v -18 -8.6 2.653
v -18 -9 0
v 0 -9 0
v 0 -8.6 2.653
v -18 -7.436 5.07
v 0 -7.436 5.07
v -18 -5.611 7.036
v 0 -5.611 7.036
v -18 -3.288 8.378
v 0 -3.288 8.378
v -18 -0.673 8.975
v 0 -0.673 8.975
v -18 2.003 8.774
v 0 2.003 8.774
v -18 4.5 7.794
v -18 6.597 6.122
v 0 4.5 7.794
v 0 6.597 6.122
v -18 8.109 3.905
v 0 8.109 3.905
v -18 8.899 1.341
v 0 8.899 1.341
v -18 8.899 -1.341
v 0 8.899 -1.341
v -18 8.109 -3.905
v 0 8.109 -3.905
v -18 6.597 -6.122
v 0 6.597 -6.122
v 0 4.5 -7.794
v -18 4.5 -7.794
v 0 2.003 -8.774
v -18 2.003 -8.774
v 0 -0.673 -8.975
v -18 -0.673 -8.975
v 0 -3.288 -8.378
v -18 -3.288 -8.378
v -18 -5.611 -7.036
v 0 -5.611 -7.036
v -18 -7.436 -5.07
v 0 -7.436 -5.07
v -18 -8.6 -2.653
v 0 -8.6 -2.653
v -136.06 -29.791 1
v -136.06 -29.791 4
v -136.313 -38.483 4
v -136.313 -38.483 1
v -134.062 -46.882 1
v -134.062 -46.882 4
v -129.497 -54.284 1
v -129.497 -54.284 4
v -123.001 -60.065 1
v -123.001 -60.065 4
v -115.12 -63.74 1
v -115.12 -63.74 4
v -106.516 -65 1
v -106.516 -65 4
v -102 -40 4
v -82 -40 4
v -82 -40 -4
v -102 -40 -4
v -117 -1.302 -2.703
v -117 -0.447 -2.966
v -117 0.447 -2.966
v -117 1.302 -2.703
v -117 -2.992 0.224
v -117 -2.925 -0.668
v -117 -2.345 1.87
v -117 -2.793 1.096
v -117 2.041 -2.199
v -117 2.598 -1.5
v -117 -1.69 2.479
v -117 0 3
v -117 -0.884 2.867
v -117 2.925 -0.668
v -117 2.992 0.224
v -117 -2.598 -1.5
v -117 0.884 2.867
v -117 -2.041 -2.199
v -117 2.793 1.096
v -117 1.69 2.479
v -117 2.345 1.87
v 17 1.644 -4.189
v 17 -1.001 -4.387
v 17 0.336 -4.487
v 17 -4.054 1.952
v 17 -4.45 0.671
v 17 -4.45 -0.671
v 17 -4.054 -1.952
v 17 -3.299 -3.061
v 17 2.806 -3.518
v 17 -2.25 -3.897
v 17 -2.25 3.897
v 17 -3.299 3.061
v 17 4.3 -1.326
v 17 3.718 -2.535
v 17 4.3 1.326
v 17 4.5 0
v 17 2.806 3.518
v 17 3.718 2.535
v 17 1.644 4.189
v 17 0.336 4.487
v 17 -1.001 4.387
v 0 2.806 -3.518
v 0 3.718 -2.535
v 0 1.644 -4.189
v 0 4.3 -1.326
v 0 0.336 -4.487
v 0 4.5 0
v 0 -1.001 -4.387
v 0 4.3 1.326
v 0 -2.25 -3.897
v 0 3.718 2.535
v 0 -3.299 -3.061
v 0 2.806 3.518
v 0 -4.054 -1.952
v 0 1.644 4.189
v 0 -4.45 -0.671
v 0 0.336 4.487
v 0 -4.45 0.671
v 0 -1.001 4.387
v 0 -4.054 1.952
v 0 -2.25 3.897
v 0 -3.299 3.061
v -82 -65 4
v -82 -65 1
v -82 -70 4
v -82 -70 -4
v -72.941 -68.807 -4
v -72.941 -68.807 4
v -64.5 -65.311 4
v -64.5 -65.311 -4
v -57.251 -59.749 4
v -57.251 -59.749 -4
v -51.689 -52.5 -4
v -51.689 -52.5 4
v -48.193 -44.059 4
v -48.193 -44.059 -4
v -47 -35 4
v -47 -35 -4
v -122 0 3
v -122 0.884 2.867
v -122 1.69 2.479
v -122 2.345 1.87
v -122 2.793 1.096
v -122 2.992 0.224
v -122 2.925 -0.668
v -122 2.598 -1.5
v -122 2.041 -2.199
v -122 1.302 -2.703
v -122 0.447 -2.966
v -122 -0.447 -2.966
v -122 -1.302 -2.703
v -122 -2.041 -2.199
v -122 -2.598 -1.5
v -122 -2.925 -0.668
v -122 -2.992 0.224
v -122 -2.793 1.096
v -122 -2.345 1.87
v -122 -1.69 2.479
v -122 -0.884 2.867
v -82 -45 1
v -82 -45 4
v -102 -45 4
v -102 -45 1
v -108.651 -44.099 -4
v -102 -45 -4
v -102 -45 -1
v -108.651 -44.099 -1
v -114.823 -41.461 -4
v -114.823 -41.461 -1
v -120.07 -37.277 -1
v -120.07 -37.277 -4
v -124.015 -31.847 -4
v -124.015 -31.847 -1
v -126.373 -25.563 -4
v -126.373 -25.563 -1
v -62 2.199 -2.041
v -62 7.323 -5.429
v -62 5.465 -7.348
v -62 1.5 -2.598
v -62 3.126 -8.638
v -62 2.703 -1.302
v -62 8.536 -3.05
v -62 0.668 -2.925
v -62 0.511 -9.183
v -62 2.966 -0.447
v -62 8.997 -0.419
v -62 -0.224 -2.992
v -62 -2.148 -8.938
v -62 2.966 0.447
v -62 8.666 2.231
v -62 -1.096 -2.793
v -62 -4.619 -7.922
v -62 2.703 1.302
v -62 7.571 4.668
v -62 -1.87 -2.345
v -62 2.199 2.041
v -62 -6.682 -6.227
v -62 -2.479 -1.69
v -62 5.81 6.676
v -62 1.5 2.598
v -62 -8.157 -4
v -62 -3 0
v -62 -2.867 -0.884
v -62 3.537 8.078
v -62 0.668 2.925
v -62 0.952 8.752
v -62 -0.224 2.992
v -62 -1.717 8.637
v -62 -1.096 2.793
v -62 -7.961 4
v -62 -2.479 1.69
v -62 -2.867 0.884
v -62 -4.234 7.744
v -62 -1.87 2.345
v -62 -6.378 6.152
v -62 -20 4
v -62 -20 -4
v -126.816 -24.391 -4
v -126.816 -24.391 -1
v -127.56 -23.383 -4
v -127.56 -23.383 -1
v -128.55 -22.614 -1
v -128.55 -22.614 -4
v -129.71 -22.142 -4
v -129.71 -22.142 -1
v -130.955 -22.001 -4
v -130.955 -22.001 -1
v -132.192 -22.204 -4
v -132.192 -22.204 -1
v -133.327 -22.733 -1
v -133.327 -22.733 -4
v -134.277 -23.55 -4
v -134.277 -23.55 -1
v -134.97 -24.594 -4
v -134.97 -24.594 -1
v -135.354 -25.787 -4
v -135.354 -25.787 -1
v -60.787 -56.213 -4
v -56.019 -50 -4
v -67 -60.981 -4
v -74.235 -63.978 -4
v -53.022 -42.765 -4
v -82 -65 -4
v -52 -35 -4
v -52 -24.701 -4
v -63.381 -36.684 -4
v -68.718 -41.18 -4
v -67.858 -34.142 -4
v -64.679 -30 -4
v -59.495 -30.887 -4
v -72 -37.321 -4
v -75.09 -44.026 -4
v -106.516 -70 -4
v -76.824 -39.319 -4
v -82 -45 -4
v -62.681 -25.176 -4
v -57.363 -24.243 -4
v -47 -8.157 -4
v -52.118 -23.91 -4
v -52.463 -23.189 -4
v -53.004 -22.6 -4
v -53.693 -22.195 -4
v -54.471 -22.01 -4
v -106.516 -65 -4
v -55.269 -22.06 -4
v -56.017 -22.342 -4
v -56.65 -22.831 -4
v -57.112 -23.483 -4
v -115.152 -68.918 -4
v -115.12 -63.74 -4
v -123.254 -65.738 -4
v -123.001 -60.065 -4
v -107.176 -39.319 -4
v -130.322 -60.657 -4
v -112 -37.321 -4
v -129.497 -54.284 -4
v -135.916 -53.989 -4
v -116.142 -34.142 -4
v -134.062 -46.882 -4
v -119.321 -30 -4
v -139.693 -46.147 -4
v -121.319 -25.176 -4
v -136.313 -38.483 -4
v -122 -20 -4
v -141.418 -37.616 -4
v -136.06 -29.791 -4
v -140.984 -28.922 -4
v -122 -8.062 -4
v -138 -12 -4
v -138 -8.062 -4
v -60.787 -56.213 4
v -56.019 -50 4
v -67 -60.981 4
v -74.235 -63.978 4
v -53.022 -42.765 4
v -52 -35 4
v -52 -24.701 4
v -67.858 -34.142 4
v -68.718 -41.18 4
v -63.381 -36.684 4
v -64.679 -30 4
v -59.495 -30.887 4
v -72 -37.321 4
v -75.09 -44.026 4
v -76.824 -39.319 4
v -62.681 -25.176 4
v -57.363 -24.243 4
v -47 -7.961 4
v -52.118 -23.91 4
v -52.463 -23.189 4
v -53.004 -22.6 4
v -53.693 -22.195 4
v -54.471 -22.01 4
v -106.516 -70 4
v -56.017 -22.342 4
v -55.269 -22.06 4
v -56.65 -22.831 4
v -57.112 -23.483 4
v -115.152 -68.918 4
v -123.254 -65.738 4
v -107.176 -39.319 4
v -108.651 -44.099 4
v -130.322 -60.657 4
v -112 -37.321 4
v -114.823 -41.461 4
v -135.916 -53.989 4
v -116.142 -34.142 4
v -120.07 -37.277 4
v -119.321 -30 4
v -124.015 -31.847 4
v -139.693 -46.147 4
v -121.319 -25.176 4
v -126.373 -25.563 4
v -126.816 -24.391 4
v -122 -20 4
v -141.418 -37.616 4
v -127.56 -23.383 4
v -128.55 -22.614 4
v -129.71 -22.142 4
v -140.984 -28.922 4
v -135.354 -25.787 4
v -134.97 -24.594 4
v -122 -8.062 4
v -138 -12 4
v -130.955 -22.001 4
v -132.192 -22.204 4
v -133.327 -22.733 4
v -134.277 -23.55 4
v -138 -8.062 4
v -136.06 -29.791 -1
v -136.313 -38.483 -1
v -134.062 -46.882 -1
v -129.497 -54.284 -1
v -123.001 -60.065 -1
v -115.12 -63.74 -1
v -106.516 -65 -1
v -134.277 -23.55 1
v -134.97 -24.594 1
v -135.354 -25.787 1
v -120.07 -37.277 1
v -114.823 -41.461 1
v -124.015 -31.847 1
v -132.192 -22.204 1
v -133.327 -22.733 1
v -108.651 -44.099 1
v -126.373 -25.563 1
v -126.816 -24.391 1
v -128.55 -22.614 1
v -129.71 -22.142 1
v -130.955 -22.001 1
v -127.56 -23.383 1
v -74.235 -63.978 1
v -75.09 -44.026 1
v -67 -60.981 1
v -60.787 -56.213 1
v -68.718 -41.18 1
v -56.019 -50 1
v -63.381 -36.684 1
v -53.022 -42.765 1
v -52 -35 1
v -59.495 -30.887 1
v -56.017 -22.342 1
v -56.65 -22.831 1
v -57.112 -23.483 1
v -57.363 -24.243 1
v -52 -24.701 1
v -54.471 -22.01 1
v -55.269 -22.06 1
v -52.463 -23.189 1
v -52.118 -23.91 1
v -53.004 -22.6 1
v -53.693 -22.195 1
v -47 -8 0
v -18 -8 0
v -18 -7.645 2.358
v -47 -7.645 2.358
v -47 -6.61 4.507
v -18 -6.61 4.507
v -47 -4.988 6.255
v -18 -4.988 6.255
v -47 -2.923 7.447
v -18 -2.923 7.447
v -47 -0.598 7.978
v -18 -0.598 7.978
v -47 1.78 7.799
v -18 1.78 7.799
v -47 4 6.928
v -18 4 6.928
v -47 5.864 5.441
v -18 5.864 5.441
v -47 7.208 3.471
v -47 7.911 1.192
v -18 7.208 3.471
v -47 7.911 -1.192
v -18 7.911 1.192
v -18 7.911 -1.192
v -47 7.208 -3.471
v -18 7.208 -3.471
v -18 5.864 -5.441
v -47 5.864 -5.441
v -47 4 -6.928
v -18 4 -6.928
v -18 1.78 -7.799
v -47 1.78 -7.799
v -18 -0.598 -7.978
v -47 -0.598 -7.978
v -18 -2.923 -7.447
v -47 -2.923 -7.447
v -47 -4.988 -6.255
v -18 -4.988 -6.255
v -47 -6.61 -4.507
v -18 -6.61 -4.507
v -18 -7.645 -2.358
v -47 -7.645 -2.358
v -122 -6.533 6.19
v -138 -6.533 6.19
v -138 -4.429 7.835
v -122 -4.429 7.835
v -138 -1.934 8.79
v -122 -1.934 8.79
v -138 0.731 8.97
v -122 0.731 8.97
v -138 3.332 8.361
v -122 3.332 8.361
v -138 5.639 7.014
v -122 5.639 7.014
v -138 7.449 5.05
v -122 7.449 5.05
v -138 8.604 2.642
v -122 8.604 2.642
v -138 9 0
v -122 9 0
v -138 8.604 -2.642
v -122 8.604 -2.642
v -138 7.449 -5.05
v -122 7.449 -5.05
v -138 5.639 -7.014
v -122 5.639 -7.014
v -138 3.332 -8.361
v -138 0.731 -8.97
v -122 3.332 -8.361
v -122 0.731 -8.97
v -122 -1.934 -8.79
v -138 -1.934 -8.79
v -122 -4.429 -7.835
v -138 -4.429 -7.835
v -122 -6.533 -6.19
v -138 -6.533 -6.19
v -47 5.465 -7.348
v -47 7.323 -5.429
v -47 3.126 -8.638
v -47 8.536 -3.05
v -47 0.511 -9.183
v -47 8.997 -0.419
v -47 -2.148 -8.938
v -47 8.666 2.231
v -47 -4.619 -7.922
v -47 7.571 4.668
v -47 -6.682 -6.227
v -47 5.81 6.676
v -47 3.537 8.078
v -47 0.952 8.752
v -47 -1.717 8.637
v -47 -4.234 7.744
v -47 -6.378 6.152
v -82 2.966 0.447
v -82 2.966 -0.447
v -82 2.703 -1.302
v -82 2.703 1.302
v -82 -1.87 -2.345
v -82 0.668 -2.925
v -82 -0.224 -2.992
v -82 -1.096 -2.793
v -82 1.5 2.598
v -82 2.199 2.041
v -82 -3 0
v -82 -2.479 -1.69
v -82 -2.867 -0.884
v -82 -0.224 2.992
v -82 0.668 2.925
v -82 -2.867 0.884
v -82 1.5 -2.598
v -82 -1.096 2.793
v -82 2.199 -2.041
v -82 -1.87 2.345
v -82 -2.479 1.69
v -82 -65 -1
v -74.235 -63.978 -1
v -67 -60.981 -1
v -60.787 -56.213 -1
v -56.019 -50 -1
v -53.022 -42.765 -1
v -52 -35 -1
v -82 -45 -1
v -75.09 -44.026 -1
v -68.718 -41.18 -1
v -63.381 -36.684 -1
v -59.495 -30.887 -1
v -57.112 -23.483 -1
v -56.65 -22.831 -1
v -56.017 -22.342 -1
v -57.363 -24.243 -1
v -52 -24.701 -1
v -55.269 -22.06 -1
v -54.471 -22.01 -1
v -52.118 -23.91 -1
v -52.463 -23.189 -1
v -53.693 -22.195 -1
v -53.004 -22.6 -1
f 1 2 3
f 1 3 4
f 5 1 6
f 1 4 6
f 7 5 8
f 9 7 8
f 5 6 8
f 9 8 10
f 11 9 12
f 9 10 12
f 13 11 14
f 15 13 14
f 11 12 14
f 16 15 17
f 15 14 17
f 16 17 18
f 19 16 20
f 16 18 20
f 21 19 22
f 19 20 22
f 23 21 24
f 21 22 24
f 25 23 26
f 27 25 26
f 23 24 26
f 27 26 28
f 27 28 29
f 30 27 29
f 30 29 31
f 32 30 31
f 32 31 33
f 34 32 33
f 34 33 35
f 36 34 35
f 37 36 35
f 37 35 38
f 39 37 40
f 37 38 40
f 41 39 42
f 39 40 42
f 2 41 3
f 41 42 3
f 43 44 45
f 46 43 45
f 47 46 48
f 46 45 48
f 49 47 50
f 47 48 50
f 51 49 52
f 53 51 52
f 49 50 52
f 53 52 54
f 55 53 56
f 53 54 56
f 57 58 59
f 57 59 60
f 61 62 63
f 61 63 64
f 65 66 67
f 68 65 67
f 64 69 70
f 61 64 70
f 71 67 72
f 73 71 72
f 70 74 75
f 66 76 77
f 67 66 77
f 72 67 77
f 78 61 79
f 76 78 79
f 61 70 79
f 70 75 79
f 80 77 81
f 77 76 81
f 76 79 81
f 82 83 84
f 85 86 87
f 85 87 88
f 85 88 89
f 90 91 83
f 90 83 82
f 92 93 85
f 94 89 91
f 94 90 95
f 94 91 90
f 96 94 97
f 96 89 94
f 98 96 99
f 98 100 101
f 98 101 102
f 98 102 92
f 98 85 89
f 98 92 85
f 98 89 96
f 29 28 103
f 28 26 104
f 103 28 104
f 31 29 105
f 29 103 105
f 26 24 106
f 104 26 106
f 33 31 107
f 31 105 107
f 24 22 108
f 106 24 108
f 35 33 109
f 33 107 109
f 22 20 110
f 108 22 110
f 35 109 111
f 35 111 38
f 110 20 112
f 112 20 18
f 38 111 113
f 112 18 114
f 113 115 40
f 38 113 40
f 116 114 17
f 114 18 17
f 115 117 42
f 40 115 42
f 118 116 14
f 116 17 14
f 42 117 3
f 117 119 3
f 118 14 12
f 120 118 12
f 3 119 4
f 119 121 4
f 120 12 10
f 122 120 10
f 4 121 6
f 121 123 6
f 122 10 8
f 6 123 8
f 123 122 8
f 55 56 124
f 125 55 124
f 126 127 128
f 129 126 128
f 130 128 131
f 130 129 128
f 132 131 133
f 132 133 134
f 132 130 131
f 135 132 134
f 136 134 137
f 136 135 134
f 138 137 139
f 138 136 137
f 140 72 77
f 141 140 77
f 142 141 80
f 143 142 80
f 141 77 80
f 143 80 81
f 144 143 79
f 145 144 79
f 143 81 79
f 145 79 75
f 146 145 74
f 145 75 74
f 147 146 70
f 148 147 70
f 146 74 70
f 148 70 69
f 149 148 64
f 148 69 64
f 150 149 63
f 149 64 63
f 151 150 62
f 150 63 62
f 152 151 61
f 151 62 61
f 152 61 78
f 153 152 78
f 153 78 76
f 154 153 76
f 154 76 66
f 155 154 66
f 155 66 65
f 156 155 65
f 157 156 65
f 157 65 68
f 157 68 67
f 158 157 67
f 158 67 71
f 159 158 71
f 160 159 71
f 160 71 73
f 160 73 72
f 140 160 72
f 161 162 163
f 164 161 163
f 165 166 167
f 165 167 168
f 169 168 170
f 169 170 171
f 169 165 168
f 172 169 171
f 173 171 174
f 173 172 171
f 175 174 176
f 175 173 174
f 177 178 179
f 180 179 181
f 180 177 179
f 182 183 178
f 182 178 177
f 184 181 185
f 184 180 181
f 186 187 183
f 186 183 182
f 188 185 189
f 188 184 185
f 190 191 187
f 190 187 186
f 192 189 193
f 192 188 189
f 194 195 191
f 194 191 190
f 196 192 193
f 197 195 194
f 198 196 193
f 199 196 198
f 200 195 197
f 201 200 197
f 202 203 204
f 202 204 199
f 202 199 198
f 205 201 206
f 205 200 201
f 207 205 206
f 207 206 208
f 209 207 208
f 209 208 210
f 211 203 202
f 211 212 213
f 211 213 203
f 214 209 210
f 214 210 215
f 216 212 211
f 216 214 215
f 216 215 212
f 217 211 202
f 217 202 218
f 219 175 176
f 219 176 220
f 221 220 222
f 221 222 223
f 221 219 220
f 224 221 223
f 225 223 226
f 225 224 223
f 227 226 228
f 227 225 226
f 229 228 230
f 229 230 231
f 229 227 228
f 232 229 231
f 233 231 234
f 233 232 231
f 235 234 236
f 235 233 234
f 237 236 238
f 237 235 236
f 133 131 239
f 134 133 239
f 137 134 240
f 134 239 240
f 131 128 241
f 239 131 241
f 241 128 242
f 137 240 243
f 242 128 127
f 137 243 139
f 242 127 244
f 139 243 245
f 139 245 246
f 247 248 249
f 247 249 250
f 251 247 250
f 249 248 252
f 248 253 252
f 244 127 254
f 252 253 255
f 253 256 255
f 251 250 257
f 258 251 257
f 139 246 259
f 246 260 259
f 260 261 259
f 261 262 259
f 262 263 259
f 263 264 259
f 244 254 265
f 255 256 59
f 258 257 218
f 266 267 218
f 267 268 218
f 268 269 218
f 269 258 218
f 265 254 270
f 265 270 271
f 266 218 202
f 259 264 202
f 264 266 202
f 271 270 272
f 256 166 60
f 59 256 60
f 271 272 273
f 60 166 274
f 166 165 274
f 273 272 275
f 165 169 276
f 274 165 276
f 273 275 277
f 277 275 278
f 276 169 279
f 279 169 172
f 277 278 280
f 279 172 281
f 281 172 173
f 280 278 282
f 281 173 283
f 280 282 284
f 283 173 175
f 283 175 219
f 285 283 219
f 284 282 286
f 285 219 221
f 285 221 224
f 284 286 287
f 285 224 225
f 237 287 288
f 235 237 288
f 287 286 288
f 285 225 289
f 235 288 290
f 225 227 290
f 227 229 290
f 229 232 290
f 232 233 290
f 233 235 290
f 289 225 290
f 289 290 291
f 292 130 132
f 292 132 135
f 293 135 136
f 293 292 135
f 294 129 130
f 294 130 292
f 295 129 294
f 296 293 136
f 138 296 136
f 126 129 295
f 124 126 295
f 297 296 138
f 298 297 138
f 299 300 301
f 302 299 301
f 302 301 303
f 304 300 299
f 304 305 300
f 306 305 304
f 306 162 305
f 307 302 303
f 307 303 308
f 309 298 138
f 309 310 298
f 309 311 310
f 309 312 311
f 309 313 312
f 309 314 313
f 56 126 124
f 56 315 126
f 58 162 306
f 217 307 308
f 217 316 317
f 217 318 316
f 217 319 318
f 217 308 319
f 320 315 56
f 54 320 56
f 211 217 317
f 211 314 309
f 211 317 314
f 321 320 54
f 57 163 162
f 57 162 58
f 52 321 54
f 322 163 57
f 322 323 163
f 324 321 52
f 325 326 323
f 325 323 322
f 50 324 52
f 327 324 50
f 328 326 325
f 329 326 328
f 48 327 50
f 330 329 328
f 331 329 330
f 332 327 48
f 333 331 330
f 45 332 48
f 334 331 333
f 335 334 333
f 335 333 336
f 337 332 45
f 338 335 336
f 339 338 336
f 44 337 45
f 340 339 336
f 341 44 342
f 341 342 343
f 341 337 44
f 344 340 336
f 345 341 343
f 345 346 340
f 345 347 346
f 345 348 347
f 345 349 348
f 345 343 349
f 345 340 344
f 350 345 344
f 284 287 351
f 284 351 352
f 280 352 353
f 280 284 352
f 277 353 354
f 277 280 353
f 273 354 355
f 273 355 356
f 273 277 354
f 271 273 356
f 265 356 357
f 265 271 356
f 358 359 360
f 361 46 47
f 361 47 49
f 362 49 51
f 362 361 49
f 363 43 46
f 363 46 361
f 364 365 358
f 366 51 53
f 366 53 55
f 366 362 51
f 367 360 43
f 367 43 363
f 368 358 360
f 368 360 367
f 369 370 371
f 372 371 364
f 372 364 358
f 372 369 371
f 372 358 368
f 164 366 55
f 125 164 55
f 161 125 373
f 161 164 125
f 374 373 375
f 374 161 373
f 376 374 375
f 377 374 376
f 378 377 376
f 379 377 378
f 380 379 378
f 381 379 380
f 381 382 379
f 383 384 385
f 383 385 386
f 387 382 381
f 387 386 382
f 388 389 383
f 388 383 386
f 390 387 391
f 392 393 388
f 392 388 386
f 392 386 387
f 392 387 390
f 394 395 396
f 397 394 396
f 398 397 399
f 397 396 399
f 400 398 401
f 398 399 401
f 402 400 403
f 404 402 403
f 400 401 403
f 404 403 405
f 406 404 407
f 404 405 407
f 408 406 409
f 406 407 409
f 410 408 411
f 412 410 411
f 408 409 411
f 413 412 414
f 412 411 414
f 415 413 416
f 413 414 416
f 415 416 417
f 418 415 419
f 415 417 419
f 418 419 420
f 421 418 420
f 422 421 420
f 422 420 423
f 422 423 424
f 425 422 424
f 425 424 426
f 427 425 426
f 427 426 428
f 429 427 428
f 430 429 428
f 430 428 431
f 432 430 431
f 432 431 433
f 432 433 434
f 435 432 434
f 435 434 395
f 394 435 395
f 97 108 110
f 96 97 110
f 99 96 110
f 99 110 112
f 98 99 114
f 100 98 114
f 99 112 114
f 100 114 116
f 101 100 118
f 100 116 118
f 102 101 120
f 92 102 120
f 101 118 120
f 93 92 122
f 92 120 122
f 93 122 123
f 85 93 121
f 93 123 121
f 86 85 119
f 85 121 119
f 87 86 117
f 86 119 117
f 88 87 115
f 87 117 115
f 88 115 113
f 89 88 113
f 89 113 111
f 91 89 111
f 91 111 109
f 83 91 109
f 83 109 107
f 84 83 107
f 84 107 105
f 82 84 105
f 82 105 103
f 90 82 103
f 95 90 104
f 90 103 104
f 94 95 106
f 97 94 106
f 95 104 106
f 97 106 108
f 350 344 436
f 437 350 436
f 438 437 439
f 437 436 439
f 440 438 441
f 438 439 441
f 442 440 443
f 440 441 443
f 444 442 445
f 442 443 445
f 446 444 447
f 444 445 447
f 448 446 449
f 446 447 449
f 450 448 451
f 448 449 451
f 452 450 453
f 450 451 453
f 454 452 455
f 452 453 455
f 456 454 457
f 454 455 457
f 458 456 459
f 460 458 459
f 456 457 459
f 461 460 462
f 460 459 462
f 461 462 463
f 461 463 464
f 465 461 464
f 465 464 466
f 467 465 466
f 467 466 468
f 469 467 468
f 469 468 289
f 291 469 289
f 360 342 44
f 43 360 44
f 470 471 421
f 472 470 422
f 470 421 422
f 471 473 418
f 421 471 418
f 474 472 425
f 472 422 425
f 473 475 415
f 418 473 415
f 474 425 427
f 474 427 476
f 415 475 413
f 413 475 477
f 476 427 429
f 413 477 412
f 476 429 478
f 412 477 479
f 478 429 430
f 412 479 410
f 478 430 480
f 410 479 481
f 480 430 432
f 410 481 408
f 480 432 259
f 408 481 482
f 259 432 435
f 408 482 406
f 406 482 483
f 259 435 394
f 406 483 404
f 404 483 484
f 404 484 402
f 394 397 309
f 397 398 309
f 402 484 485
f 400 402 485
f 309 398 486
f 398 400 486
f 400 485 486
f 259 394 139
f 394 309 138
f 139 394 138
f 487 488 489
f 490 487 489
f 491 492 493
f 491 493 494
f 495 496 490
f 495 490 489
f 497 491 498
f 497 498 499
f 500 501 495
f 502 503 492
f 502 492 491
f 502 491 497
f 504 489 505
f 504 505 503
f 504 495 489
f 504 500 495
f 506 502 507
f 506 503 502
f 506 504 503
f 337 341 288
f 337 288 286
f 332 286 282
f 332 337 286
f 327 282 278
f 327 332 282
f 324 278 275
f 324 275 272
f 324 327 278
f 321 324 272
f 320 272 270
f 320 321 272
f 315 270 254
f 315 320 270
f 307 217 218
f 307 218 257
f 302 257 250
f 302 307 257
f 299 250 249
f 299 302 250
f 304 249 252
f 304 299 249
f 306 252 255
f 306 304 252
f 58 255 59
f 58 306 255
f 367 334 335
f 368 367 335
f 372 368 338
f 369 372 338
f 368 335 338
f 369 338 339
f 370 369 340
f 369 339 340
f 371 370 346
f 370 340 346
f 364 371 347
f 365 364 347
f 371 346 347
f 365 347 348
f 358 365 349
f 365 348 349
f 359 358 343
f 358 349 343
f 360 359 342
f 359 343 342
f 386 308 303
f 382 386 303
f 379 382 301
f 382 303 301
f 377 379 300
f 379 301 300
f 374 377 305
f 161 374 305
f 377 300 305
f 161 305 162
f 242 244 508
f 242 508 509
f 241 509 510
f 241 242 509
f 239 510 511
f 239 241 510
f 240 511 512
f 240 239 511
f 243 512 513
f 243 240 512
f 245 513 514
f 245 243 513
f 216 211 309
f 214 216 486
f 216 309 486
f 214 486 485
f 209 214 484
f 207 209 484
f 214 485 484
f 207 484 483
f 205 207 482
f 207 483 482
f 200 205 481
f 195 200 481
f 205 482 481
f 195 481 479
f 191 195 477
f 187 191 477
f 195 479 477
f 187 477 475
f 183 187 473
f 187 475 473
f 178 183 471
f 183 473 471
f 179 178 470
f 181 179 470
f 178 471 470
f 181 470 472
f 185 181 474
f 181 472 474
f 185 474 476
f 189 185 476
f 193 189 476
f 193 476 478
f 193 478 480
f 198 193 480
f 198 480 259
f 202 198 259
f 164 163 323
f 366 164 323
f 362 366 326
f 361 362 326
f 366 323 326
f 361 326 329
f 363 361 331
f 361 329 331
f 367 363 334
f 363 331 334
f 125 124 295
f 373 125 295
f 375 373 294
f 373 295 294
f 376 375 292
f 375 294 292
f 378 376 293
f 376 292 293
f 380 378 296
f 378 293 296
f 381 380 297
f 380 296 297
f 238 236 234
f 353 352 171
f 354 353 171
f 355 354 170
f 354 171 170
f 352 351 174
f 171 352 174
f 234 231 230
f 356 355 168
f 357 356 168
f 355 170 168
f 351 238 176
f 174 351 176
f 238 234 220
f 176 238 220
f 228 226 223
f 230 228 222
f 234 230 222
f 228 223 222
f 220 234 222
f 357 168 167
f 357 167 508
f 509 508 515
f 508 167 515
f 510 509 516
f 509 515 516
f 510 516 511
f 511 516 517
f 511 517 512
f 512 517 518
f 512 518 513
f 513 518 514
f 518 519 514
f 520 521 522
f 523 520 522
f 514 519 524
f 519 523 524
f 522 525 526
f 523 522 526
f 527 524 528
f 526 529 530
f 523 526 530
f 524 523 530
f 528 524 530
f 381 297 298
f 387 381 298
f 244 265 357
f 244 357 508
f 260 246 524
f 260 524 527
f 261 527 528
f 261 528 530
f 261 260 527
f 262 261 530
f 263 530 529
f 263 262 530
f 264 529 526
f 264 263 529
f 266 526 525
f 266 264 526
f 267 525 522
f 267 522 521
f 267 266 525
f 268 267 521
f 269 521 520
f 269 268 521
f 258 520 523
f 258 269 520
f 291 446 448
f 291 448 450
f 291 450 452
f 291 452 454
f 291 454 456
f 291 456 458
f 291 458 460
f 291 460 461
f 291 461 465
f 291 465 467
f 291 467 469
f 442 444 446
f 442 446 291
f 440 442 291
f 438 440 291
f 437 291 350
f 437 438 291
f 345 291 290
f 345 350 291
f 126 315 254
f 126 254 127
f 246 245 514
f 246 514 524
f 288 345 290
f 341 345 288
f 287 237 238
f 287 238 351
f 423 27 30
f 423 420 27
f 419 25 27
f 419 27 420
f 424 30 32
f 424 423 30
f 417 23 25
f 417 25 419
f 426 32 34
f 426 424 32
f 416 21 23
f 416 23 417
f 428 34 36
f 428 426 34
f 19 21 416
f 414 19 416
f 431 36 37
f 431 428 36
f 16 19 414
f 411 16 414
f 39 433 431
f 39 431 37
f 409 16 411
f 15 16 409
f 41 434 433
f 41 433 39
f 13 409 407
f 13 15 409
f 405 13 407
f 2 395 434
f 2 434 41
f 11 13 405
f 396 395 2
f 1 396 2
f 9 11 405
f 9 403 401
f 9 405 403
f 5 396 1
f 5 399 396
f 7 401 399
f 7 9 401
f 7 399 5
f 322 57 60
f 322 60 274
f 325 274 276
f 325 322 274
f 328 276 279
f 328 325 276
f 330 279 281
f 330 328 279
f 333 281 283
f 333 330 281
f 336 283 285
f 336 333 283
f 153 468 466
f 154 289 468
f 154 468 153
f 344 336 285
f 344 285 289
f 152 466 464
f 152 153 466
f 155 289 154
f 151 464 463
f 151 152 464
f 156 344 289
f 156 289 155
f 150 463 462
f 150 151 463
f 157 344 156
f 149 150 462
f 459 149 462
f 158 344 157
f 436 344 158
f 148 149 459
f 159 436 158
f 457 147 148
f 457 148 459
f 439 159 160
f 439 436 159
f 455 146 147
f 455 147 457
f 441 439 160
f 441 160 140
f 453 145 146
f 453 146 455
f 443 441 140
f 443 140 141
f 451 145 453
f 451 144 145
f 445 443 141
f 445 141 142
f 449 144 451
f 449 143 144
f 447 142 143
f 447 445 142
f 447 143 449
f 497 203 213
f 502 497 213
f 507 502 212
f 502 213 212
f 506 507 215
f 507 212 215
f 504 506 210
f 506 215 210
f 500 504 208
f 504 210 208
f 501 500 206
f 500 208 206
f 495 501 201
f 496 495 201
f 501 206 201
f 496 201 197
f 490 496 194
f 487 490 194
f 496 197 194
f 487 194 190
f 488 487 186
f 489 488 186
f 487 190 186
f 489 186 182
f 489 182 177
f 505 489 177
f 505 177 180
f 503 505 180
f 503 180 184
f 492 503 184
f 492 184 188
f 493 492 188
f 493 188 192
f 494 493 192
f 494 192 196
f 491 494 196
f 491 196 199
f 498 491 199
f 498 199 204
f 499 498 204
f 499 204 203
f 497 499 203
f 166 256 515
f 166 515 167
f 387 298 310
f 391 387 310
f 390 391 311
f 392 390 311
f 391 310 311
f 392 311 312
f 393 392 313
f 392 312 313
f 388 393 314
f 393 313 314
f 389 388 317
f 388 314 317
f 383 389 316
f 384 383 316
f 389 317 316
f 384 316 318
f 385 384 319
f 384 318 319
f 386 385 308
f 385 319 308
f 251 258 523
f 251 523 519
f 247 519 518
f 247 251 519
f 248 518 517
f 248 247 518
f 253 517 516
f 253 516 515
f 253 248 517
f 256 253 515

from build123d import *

# Parameters (mm, degrees)
SKETCH2_R           = 4.5
BOSS_EXTRUDE1_DEPTH = 17
SKETCH3_R           = 9
BOSS_EXTRUDE2_DEPTH = 18
SKETCH4_R           = 8
BOSS_EXTRUDE3_DEPTH = 29
SKETCH5_R           = 9
BOSS_EXTRUDE4_DEPTH = 15
SKETCH6_R           = 3
BOSS_EXTRUDE5_DEPTH = 20
BOSS_EXTRUDE6_DEPTH = 4
SKETCH17_R          = 3
BOSS_EXTRUDE7_DEPTH = 5
SKETCH18_R          = 9
BOSS_EXTRUDE8_DEPTH = 16
CUT_EXTRUDE1_DEPTH  = 3


with BuildPart() as part:
    # Sketch2 → Boss-Extrude1 (new body)
    with BuildSketch(Plane.YZ):
        Circle(SKETCH2_R)
    extrude(amount=BOSS_EXTRUDE1_DEPTH)

    # Sketch3 → Boss-Extrude2 (add)
    with BuildSketch(Plane(origin=(0, 0, 0), x_dir=(0, -1, 0), z_dir=(-1, 0, 0))):
        Circle(SKETCH3_R)
    extrude(amount=BOSS_EXTRUDE2_DEPTH)

    # Sketch4 → Boss-Extrude3 (add)
    with BuildSketch(Plane(origin=(-18, 0, 0), x_dir=(0, -1, 0), z_dir=(-1, 0, 0))):
        Circle(SKETCH4_R)
    extrude(amount=BOSS_EXTRUDE3_DEPTH)

    # Sketch5 → Boss-Extrude4 (add)
    with BuildSketch(Plane(origin=(-47, 0, 0), x_dir=(0, -1, 0), z_dir=(-1, 0, 0))):
        with Locations((0, -0.197923741)):
            Circle(SKETCH5_R)
    extrude(amount=BOSS_EXTRUDE4_DEPTH)

    # Sketch6 → Boss-Extrude5 (add)
    with BuildSketch(Plane(origin=(-62, 0, 0), x_dir=(0, -1, 0), z_dir=(-1, 0, 0))):
        Circle(SKETCH6_R)
    extrude(amount=BOSS_EXTRUDE5_DEPTH)

    # Sketch16 → Boss-Extrude6 (add, symmetric)
    with BuildSketch(Plane(origin=(0, 0, 0), x_dir=(0, 1, 0), z_dir=(0, 0, 1))):
        with BuildLine():
            Line((0, 62), (-20, 62))
            ThreePointArc((-20, 62), (-34.142135624, 67.857864376), (-40, 82))
            Line((-40, 82), (-40, 102))
            ThreePointArc((-40, 102), (-34.142135624, 116.142135624), (-20, 122))
            Line((-20, 122), (0, 122))
            Line((0, 122), (0, 138))
            Line((0, 138), (-12, 138))
            Line((-12, 138), (-28.922313782, 140.983860496))
            ThreePointArc((-28.922313782, 140.983860496), (-57.497566339, 133.327144649), (-70, 106.51558914))
            Line((-70, 106.51558914), (-70, 82))
            ThreePointArc((-70, 82), (-59.748737342, 57.251262658), (-35, 47))
            Line((-35, 47), (0, 47))
            Line((0, 47), (0, 62))
        make_face()
    extrude(amount=BOSS_EXTRUDE6_DEPTH, both=True)



with BuildPart() as body_2:
    # Sketch17 → Boss-Extrude7 (new body)
    with BuildSketch(Plane.ZY.offset(117)):
        Circle(SKETCH17_R)
    extrude(amount=BOSS_EXTRUDE7_DEPTH)


with BuildPart() as part_1:
    add(part.part)

    add(body_2.part)  # Boss-Extrude8 merges body 2
    # Sketch18 → Boss-Extrude8 (add)
    with BuildSketch(Plane(origin=(-122, 0, 0), x_dir=(0, -1, 0), z_dir=(-1, 0, 0))):
        Circle(SKETCH18_R)
    extrude(amount=BOSS_EXTRUDE8_DEPTH)

    # Sketch21 → Cut-Extrude1 (cut)
    with BuildSketch(Plane.XY.offset(4)):
        with BuildLine():
            Line((-106.51558914, -65), (-82, -65))
            ThreePointArc((-82, -65), (-60.786796564, -56.213203436), (-52, -35))
            Line((-52, -35), (-52, -24.70089464))
            ThreePointArc((-52, -24.70089464), (-54.470885592, -22.009811643), (-57.362613993, -24.24254767))
            ThreePointArc((-57.362613993, -24.24254767), (-65.891984786, -39.11888715), (-82, -45))
            Line((-82, -45), (-102, -45))
            ThreePointArc((-102, -45), (-117.587304364, -39.545739757), (-126.373231569, -25.562875413))
            ThreePointArc((-126.373231569, -25.562875413), (-130.955140822, -22.001423997), (-135.353853676, -25.786810875))
            Line((-135.353853676, -25.786810875), (-136.059821731, -29.79055467))
            ThreePointArc((-136.059821731, -29.79055467), (-129.496922434, -54.283628291), (-106.51558914, -65))
        make_face()
    cut_extrude1 = extrude(amount=-CUT_EXTRUDE1_DEPTH, mode=Mode.SUBTRACT)

    # Mirror1: Cut-Extrude1 across plane
    add(cut_extrude1.mirror(Plane.XY), mode=Mode.SUBTRACT)


solid = part_1.part
